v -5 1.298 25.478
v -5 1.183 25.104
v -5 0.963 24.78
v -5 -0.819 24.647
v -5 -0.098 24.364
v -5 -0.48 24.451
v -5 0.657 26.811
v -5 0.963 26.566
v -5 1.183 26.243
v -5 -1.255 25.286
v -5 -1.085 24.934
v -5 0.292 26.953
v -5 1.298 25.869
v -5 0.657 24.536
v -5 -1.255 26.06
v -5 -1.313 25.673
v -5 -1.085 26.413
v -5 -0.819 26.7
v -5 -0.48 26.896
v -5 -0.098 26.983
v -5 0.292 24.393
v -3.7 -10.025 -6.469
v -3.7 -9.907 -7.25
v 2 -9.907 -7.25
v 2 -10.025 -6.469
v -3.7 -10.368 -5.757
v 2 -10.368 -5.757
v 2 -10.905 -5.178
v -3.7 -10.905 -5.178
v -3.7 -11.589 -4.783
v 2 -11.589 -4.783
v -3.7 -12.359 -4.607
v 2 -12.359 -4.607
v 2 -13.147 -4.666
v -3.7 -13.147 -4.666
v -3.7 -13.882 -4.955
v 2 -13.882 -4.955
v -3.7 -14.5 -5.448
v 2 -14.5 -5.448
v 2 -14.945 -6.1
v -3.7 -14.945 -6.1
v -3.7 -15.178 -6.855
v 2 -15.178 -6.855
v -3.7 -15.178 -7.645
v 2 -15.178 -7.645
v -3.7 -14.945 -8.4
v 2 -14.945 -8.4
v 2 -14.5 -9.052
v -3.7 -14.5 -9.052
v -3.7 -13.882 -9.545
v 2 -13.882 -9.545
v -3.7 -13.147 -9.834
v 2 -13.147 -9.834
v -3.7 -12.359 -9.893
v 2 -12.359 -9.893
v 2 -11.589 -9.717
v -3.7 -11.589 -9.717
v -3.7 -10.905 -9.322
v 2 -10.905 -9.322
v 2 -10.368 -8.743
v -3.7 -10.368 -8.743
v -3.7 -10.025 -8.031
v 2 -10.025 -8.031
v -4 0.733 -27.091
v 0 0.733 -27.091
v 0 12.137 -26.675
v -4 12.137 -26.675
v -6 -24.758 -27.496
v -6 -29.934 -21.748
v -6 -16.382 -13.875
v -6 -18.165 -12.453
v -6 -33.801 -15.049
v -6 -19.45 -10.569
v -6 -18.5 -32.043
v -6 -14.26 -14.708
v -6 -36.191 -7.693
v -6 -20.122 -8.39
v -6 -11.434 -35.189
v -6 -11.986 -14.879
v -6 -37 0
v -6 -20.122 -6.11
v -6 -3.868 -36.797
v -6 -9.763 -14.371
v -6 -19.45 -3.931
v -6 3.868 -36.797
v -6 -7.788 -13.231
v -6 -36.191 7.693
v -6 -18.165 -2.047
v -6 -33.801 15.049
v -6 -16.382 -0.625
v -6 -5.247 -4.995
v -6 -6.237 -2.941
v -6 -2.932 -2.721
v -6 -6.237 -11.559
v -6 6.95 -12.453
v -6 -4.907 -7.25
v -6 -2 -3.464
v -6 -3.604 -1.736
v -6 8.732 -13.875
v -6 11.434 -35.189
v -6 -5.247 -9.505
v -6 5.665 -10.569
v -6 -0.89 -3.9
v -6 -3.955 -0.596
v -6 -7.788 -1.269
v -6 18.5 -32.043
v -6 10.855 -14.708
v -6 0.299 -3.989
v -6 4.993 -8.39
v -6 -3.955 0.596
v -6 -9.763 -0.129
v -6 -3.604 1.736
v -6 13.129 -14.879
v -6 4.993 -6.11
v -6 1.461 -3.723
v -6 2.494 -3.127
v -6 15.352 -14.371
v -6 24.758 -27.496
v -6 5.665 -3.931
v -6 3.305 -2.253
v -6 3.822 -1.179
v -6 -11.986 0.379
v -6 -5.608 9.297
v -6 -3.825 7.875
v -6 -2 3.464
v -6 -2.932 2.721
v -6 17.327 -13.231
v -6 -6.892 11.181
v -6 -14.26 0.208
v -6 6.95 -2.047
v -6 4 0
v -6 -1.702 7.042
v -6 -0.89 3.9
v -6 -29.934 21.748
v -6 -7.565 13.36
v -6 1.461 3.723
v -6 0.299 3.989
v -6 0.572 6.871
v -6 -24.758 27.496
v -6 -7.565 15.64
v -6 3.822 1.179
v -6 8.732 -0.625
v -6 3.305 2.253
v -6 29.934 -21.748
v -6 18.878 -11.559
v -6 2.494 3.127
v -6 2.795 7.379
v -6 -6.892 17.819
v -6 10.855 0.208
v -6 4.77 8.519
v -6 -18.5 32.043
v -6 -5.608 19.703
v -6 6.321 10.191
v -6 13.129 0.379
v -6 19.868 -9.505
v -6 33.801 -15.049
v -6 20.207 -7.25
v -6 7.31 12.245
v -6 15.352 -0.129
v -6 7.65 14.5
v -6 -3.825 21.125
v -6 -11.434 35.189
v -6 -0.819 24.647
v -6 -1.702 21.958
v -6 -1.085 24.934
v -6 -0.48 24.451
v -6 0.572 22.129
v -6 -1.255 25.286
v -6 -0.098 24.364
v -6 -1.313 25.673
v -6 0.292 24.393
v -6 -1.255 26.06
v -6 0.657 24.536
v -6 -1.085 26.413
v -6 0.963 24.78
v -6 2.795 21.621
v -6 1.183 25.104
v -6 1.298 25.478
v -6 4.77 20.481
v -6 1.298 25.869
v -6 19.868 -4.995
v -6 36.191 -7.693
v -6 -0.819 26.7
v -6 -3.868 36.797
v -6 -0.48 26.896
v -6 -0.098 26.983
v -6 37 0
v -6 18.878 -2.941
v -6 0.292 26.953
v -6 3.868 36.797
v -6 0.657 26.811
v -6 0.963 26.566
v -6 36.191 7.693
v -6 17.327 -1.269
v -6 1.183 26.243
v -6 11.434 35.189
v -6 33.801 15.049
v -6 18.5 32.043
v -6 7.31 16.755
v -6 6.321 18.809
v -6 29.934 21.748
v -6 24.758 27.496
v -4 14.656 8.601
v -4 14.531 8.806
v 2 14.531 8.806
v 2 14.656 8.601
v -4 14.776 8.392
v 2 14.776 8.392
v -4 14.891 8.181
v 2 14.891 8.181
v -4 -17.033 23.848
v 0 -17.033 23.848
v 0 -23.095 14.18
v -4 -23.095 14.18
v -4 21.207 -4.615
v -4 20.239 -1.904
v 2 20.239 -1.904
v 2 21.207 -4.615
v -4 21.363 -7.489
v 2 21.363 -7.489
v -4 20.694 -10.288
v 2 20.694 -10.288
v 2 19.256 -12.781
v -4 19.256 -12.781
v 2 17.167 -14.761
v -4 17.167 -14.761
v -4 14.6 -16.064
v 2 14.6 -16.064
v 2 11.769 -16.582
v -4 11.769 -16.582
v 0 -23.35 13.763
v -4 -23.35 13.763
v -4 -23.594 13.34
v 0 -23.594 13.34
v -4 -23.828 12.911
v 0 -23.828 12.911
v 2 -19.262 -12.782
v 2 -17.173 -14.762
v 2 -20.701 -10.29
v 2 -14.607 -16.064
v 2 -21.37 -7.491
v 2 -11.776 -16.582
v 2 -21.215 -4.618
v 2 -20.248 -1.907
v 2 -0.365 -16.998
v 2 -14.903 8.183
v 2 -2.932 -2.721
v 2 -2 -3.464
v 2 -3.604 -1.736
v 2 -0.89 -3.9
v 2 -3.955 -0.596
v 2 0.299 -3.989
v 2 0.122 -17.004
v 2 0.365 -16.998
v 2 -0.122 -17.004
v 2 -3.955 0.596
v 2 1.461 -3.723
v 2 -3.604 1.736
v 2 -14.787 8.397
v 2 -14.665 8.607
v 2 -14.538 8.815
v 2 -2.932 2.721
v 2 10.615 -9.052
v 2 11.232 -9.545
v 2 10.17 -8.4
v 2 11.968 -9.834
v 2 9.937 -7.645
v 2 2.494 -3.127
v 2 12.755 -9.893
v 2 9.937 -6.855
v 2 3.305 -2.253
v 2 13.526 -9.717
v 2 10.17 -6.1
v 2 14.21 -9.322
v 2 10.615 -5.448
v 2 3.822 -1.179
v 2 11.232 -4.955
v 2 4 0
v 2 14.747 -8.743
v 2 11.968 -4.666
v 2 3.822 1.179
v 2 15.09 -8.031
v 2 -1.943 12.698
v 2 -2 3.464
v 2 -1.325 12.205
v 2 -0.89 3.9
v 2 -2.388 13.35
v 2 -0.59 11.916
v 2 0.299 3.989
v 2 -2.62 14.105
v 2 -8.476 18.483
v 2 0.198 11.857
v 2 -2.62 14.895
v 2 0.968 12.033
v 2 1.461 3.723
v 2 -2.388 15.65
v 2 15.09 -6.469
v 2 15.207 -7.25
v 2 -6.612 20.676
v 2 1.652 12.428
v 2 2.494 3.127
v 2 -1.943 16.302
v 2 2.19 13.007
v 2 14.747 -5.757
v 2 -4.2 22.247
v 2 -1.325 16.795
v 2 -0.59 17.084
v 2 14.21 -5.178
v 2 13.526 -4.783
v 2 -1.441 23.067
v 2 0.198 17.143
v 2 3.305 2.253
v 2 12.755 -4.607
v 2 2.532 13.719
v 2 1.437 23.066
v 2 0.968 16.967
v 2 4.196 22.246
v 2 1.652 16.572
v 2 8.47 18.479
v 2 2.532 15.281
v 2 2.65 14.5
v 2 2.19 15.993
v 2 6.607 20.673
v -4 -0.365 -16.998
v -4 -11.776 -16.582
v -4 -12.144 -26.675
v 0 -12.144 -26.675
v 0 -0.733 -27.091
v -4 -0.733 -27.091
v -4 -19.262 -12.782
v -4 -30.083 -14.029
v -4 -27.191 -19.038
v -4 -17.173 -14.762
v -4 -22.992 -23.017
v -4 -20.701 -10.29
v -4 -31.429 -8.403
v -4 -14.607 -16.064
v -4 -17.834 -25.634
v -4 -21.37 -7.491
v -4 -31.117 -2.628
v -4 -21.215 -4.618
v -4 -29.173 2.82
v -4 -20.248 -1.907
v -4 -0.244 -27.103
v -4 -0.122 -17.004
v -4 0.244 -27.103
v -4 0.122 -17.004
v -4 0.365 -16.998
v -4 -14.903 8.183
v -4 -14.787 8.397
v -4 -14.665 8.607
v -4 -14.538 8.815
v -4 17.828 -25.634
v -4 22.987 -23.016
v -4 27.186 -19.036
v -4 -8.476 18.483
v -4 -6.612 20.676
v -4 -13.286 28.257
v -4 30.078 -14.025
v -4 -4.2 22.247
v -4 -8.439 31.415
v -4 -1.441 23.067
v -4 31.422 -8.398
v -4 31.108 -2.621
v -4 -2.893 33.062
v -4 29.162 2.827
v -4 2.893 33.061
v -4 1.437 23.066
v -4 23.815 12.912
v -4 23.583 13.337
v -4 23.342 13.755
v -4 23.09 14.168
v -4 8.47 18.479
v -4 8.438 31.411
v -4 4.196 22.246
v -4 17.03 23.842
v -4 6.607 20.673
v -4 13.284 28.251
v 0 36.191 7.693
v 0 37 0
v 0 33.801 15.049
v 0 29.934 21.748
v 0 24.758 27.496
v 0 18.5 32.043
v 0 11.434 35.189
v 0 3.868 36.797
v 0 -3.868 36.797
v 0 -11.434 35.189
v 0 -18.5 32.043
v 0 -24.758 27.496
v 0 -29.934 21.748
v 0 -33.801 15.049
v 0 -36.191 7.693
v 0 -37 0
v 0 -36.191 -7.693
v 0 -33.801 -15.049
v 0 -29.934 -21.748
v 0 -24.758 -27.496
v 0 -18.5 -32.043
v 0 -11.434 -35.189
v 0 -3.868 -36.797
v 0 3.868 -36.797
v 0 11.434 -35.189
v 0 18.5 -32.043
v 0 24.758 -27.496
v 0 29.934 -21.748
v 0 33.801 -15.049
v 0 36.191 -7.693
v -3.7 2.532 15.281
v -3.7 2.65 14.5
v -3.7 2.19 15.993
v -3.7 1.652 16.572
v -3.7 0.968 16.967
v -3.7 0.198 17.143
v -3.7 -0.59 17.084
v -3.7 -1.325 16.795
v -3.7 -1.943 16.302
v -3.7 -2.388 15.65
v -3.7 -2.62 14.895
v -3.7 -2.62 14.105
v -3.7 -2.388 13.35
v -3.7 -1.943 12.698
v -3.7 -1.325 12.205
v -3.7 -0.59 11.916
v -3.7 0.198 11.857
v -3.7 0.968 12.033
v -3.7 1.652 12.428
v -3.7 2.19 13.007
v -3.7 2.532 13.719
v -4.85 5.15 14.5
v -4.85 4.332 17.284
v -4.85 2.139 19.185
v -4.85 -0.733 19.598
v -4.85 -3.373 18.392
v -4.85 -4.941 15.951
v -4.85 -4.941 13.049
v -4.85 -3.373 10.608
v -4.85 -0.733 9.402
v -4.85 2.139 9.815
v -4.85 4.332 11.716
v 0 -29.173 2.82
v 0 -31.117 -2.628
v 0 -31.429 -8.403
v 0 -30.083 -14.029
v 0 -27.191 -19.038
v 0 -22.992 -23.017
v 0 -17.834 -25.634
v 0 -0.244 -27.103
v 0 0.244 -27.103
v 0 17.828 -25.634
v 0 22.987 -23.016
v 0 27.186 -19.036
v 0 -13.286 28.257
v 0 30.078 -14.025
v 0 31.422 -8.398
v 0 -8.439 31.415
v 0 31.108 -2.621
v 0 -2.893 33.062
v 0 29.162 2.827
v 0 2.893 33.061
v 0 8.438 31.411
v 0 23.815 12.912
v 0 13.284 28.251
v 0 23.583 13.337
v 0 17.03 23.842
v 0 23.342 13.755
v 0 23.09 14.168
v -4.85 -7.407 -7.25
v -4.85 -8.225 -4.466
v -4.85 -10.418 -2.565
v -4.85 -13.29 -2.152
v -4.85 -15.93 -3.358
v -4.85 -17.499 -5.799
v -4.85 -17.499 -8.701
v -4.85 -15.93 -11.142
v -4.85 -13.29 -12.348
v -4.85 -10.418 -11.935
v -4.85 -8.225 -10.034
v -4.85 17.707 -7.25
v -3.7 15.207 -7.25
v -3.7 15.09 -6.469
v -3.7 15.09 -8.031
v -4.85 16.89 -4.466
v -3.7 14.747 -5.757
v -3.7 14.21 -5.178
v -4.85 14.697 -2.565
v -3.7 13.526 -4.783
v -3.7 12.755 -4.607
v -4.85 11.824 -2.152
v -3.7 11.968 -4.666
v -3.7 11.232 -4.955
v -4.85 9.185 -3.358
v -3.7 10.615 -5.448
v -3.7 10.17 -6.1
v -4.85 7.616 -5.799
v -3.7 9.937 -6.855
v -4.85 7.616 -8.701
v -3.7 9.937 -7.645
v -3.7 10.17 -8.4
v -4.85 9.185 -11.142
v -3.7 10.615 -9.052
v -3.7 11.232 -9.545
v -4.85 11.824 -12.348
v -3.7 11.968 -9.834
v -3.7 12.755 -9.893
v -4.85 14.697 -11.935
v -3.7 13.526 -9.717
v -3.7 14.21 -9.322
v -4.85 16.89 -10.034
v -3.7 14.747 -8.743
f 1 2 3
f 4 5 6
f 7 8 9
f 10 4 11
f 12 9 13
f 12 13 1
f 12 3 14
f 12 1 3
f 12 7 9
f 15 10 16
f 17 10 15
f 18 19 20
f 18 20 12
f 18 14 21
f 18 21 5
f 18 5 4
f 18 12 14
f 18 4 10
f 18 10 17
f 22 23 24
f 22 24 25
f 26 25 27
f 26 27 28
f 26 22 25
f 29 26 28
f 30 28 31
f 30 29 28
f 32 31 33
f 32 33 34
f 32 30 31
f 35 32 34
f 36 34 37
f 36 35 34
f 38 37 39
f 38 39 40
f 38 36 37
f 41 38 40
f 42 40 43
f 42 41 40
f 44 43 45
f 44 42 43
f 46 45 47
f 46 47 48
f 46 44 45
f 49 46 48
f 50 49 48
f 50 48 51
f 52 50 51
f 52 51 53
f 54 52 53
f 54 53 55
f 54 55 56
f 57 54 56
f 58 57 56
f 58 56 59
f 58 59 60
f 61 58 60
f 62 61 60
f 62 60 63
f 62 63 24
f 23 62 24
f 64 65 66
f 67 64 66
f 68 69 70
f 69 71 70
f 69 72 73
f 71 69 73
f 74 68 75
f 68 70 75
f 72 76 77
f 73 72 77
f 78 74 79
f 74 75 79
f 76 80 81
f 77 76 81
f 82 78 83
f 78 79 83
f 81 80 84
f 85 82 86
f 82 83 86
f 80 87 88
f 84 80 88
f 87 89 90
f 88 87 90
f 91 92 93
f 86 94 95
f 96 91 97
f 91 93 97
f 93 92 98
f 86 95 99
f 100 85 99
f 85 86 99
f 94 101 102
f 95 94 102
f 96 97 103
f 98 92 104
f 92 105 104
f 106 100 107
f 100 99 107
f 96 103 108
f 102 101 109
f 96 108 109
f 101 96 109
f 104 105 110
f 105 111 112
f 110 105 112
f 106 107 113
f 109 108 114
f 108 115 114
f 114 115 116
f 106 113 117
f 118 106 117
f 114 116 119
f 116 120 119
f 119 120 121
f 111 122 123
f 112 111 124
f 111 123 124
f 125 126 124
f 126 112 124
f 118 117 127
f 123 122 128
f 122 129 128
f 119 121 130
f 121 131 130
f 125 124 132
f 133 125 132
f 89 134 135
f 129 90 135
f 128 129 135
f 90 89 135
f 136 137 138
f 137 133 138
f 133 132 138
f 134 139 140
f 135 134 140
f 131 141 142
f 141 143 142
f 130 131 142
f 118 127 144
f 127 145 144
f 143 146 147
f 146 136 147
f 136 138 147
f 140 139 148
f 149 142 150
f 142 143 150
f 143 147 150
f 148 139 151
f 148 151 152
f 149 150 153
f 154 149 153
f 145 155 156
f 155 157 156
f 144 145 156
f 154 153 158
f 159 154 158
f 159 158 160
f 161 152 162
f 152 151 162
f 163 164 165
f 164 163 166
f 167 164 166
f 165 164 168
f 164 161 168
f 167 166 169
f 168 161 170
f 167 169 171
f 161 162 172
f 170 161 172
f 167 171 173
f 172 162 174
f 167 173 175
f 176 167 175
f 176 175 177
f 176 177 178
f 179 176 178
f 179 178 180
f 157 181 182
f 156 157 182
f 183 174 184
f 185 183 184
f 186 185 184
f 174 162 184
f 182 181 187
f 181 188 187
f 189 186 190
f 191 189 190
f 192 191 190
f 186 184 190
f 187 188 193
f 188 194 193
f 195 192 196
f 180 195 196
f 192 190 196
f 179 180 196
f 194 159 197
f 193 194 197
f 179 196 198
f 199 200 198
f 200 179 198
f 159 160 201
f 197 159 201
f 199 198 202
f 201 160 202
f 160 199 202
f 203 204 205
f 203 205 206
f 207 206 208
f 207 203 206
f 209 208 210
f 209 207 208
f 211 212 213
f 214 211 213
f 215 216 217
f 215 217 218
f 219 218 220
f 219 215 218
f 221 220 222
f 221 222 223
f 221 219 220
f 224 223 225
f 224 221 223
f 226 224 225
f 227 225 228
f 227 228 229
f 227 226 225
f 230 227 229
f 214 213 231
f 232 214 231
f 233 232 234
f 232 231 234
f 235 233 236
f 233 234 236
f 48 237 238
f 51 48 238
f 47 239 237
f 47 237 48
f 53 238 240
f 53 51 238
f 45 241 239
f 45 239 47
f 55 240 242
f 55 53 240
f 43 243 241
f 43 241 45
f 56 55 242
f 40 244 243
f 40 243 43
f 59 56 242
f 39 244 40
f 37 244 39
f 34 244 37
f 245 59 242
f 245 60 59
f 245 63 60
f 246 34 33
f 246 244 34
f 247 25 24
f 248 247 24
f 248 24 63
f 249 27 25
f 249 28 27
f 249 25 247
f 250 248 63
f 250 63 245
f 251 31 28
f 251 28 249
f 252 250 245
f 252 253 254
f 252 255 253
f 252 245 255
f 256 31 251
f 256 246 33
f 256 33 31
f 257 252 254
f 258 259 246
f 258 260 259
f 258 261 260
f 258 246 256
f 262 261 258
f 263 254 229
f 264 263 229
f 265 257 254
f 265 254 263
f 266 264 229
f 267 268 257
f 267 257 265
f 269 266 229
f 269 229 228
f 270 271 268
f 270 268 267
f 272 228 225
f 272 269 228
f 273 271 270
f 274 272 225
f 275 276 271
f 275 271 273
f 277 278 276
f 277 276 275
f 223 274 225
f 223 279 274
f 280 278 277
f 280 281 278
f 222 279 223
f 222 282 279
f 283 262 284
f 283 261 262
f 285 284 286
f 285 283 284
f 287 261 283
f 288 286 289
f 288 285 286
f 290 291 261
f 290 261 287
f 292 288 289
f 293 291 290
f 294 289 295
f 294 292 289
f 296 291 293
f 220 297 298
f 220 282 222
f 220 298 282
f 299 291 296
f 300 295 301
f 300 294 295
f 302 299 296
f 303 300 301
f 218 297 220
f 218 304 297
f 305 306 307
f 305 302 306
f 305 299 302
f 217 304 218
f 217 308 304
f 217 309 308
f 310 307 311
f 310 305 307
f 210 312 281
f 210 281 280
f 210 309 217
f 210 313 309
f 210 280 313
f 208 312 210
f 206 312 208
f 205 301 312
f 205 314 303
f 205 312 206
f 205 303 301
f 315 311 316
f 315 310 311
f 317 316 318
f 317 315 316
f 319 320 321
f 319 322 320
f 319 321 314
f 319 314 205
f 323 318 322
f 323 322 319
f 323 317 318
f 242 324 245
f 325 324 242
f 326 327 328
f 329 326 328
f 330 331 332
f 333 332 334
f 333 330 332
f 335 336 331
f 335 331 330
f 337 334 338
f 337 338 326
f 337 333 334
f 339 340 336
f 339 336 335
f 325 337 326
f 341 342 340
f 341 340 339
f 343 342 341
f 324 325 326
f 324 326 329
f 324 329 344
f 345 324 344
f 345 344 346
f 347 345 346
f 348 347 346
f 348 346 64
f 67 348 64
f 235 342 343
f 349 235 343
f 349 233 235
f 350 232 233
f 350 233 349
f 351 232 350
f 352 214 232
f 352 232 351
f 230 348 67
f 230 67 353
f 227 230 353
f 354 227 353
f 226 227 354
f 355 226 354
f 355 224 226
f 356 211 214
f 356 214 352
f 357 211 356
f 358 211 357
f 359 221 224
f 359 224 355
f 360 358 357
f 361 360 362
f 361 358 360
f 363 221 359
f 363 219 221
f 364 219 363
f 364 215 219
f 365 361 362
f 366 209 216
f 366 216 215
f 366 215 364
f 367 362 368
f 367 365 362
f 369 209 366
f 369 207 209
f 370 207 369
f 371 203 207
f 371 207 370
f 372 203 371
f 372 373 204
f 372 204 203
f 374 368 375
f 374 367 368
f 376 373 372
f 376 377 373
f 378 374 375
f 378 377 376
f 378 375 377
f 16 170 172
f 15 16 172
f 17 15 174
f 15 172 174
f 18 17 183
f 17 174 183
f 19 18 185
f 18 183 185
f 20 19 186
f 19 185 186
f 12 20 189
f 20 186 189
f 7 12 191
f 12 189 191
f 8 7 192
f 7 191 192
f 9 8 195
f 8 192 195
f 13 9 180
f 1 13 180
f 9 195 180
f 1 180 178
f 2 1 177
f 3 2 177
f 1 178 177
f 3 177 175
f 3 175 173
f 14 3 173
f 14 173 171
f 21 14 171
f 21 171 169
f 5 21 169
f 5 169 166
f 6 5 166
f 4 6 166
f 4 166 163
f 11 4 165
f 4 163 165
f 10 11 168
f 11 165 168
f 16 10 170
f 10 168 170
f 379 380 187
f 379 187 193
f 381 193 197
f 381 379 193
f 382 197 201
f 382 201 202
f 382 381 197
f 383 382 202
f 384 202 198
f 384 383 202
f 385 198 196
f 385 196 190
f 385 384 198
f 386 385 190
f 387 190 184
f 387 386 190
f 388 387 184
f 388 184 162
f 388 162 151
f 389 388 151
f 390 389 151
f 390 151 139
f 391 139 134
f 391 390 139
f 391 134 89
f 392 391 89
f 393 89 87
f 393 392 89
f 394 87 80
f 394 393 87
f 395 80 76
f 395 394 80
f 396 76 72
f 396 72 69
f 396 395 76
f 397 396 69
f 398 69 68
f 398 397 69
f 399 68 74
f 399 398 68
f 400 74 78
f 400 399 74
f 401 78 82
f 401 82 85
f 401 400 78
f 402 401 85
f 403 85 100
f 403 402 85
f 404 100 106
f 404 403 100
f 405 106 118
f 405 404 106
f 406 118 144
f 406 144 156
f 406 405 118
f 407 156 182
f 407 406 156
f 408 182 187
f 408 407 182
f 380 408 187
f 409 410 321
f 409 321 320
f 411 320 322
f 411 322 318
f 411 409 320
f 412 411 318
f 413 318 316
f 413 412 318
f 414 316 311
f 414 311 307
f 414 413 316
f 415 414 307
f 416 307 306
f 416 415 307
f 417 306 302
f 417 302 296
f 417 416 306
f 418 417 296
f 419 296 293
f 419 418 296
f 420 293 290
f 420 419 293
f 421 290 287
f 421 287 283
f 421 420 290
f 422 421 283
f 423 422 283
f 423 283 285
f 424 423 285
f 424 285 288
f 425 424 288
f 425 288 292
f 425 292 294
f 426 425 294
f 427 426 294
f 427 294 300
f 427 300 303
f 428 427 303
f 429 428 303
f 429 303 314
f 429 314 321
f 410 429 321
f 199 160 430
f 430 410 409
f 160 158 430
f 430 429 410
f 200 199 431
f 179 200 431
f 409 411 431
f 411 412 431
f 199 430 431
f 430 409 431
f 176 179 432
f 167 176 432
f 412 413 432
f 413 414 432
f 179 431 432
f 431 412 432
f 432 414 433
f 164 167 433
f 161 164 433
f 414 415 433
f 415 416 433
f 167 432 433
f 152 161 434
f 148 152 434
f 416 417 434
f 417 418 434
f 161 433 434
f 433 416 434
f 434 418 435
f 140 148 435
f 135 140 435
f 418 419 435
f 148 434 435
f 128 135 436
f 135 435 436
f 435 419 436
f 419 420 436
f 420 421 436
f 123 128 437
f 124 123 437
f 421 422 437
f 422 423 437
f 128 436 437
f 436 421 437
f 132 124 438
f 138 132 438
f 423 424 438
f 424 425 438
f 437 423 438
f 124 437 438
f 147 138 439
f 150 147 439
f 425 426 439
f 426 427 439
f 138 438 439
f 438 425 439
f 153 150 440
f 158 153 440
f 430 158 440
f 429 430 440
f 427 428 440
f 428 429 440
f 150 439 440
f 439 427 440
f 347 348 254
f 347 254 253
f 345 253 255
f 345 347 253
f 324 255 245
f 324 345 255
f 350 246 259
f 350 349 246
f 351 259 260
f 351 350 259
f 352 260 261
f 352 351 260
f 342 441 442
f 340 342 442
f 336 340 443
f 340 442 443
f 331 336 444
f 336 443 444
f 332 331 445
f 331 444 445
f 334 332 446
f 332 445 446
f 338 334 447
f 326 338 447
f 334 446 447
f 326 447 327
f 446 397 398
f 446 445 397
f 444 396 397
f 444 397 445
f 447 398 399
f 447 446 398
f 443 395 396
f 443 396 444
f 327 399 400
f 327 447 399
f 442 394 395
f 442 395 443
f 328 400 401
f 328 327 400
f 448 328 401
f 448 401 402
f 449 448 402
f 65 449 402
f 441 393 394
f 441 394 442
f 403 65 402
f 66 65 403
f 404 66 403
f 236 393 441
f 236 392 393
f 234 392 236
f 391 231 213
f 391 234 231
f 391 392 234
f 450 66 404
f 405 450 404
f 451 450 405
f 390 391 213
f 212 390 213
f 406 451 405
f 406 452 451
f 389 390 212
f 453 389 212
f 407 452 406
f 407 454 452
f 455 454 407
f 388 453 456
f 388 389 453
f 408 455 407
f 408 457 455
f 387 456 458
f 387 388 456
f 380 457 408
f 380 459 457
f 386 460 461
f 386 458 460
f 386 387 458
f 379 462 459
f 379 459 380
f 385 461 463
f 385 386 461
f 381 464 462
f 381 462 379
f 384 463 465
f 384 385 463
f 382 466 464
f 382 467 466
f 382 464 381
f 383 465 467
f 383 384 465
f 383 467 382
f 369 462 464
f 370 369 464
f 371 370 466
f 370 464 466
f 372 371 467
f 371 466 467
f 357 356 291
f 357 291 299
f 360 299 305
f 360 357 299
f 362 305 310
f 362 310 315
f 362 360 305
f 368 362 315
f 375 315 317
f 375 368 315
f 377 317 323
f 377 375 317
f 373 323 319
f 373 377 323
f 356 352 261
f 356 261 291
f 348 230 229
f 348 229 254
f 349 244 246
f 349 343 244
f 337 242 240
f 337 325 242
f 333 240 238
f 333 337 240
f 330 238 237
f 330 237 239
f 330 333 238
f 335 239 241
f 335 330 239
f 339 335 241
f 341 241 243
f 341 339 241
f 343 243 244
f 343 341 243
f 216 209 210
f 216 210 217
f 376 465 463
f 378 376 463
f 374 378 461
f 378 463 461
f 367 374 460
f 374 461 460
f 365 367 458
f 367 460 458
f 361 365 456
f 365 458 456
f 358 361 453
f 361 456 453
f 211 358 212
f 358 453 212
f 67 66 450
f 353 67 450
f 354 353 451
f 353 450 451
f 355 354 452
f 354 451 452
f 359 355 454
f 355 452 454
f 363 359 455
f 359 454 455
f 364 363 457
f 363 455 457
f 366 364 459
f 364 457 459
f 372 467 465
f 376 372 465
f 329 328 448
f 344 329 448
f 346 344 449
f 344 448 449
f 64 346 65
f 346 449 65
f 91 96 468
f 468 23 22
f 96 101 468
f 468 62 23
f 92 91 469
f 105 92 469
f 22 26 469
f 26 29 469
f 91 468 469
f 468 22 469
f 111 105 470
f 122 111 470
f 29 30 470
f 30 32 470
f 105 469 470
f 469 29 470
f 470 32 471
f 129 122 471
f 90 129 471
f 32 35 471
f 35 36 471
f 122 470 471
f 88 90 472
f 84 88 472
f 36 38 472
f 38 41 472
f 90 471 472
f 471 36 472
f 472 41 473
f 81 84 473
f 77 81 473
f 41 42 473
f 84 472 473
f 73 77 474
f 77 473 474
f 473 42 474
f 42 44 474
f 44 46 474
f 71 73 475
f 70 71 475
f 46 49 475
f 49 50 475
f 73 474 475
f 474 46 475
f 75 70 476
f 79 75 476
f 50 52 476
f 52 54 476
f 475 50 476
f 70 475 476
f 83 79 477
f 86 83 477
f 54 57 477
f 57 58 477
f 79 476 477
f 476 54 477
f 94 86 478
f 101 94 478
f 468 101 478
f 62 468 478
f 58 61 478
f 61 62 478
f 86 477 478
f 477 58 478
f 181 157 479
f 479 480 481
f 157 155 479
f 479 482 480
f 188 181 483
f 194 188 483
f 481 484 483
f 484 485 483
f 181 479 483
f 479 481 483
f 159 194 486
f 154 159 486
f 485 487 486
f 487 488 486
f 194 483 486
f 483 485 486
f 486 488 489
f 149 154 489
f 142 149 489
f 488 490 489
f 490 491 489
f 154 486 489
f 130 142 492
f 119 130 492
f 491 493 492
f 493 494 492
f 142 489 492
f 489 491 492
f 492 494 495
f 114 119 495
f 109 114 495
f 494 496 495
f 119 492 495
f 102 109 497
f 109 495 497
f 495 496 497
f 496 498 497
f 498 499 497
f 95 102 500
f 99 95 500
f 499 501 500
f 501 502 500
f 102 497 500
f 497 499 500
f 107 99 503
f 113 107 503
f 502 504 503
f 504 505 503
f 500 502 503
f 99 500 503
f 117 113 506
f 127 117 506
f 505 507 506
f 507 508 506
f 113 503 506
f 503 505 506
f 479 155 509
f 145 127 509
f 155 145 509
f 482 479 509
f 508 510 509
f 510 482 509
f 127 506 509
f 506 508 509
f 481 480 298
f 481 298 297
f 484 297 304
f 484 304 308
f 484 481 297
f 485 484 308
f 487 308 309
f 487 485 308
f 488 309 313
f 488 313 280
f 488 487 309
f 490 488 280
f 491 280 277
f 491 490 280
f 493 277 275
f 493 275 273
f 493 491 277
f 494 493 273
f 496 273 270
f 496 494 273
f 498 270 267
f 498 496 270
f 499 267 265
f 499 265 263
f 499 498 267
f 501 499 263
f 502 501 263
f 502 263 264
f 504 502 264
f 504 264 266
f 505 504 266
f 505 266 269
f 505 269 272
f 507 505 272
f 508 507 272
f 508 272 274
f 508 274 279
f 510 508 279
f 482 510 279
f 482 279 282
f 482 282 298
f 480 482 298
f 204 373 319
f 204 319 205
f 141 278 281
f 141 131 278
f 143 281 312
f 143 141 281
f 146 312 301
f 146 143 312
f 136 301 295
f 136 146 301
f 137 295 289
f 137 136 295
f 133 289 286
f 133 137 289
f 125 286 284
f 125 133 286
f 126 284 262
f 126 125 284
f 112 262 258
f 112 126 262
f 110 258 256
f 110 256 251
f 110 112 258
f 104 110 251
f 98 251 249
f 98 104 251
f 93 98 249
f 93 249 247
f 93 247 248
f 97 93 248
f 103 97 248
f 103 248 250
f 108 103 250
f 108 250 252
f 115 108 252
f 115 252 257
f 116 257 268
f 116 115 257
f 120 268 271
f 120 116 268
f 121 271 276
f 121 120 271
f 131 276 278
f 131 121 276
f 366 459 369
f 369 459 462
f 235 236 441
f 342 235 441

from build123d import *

# Parameters (mm, degrees)
F0_R     = 37
F0_R_2   = 2.65
F0_R_3   = 4
F1_DEPTH = 6
F2_DEPTH = 4
F3_DEPTH = 2
F4_SIZE2 = 2.3
F4_SIZE  = 5
F5_R     = 1.3130068335
F6_DEPTH = 1


with BuildPart() as f1:
    # F0 (on Right) → F1 (new body)
    with BuildSketch(Plane.YZ):
        Circle(F0_R)
        with BuildLine():
            Line((-23.0952370323, 14.180454946), (-17.0328632471, 23.8484731203))
            ThreePointArc((-17.0328632471, 23.8484731203), (0.0002590164, 33.2703478915), (17.0295377344, 23.8415279974))
            Line((17.0295377344, 23.8415279974), (23.0899184639, 14.167925942))
            ThreePointArc((23.0899184639, 14.167925942), (23.4636524397, 13.5467460522), (23.8147430167, 12.9124929901))
            Line((23.8147430167, 12.9124929901), (29.162137778, 2.827248294))
            ThreePointArc((29.162137778, 2.827248294), (28.813095975, -16.6349496309), (12.1369519401, -26.6751288313))
            Line((12.1369519401, -26.6751288313), (0.7330157043, -27.0912894495))
            ThreePointArc((0.7330157043, -27.0912894495), (0, -27.1046598669), (-0.7330157043, -27.0912894495))
            Line((-0.7330157043, -27.0912894495), (-12.1441739659, -26.6748652799))
            ThreePointArc((-12.1441739659, -26.6748652799), (-28.8182692269, -16.6382354957), (-29.1731979579, 2.8202694775))
            Line((-29.1731979579, 2.8202694775), (-23.8282527367, 12.9108345034))
            ThreePointArc((-23.8282527367, 12.9108345034), (-23.4733240056, 13.5523299334), (-23.0952370323, 14.180454946))
        make_face(mode=Mode.SUBTRACT)
        with BuildLine():
            ThreePointArc((17.0295377344, 23.8415279974), (0.0002590164, 33.2703478915), (-17.0328632471, 23.8484731203))
            Line((-17.0328632471, 23.8484731203), (-23.0952370323, 14.180454946))
            ThreePointArc((-23.0952370323, 14.180454946), (-23.4733240056, 13.5523299334), (-23.8282527367, 12.9108345034))
            Line((-23.8282527367, 12.9108345034), (-29.1731979579, 2.8202694775))
            ThreePointArc((-29.1731979579, 2.8202694775), (-28.8182692269, -16.6382354957), (-12.1441739659, -26.6748652799))
            Line((-12.1441739659, -26.6748652799), (-0.7330157043, -27.0912894495))
            ThreePointArc((-0.7330157043, -27.0912894495), (0, -27.1046598669), (0.7330157043, -27.0912894495))
            Line((0.7330157043, -27.0912894495), (12.1369519401, -26.6751288313))
            ThreePointArc((12.1369519401, -26.6751288313), (28.813095975, -16.6349496309), (29.162137778, 2.827248294))
            Line((29.162137778, 2.827248294), (23.8147430167, 12.9124929901))
            ThreePointArc((23.8147430167, 12.9124929901), (23.4636524397, 13.5467460522), (23.0899184639, 14.167925942))
            Line((23.0899184639, 14.167925942), (17.0295377344, 23.8415279974))
        make_face()
        with BuildLine():
            Line((-14.5383641102, 8.8148297318), (-8.4759903249, 18.482847906))
            ThreePointArc((-8.4759903249, 18.482847906), (-0.0018003141, 23.1703476982), (8.4704774851, 18.4793926211))
            Line((8.4704774851, 18.4793926211), (14.5308582146, 8.8057905657))
            ThreePointArc((14.5308582146, 8.8057905657), (14.7167955123, 8.4967458506), (14.8914674376, 8.1811970698))
            Line((14.8914674376, 8.1811970698), (20.2388621989, -1.9040476263))
            ThreePointArc((20.2388621989, -1.9040476263), (20.0652095641, -11.5867329668), (11.7686206585, -16.5818468966))
            Line((11.7686206585, -16.5818468966), (0.3646844227, -16.9980075148))
            ThreePointArc((0.3646844227, -16.9980075148), (0, -17.0046594636), (-0.3646844227, -16.9980075148))
            Line((-0.3646844227, -16.9980075148), (-11.7758426843, -16.5815833453))
            ThreePointArc((-11.7758426843, -16.5815833453), (-20.0714122995, -11.5882352941), (-20.2479937541, -1.9073872429))
            Line((-20.2479937541, -1.9073872429), (-14.9030485329, 8.183177783))
            ThreePointArc((-14.9030485329, 8.183177783), (-14.7264670782, 8.5023297318), (-14.5383641102, 8.8148297318))
        make_face(mode=Mode.SUBTRACT)
        with BuildLine():
            ThreePointArc((8.4704774851, 18.4793926211), (-0.0018003141, 23.1703476982), (-8.4759903249, 18.482847906))
            Line((-8.4759903249, 18.482847906), (-14.5383641102, 8.8148297318))
            ThreePointArc((-14.5383641102, 8.8148297318), (-14.7264670782, 8.5023297318), (-14.9030485329, 8.183177783))
            Line((-14.9030485329, 8.183177783), (-20.2479937541, -1.9073872429))
            ThreePointArc((-20.2479937541, -1.9073872429), (-20.0714122995, -11.5882352941), (-11.7758426843, -16.5815833453))
            Line((-11.7758426843, -16.5815833453), (-0.3646844227, -16.9980075148))
            ThreePointArc((-0.3646844227, -16.9980075148), (0, -17.0046594636), (0.3646844227, -16.9980075148))
            Line((0.3646844227, -16.9980075148), (11.7686206585, -16.5818468966))
            ThreePointArc((11.7686206585, -16.5818468966), (20.0652095641, -11.5867329668), (20.2388621989, -1.9040476263))
            Line((20.2388621989, -1.9040476263), (14.8914674376, 8.1811970698))
            ThreePointArc((14.8914674376, 8.1811970698), (14.7167955123, 8.4967458506), (14.5308582146, 8.8057905657))
            Line((14.5308582146, 8.8057905657), (8.4704774851, 18.4793926211))
        make_face()
        with Locations((-12.5573683549, -7.25)):
            Circle(F0_R_2, mode=Mode.SUBTRACT)
        with Locations((12.5573683549, -7.25)):
            Circle(F0_R_2, mode=Mode.SUBTRACT)
        Circle(F0_R_3, mode=Mode.SUBTRACT)
        with Locations((0, 14.5)):
            Circle(F0_R_2, mode=Mode.SUBTRACT)
    extrude(amount=-F1_DEPTH)

    # F0 (on Right) → F2 (cut)
    with BuildSketch(Plane.YZ):
        with BuildLine():
            ThreePointArc((17.0295377344, 23.8415279974), (0.0002590164, 33.2703478915), (-17.0328632471, 23.8484731203))
            Line((-17.0328632471, 23.8484731203), (-23.0952370323, 14.180454946))
            ThreePointArc((-23.0952370323, 14.180454946), (-23.4733240056, 13.5523299334), (-23.8282527367, 12.9108345034))
            Line((-23.8282527367, 12.9108345034), (-29.1731979579, 2.8202694775))
            ThreePointArc((-29.1731979579, 2.8202694775), (-28.8182692269, -16.6382354957), (-12.1441739659, -26.6748652799))
            Line((-12.1441739659, -26.6748652799), (-0.7330157043, -27.0912894495))
            ThreePointArc((-0.7330157043, -27.0912894495), (0, -27.1046598669), (0.7330157043, -27.0912894495))
            Line((0.7330157043, -27.0912894495), (12.1369519401, -26.6751288313))
            ThreePointArc((12.1369519401, -26.6751288313), (28.813095975, -16.6349496309), (29.162137778, 2.827248294))
            Line((29.162137778, 2.827248294), (23.8147430167, 12.9124929901))
            ThreePointArc((23.8147430167, 12.9124929901), (23.4636524397, 13.5467460522), (23.0899184639, 14.167925942))
            Line((23.0899184639, 14.167925942), (17.0295377344, 23.8415279974))
        make_face()
        with BuildLine():
            Line((-14.5383641102, 8.8148297318), (-8.4759903249, 18.482847906))
            ThreePointArc((-8.4759903249, 18.482847906), (-0.0018003141, 23.1703476982), (8.4704774851, 18.4793926211))
            Line((8.4704774851, 18.4793926211), (14.5308582146, 8.8057905657))
            ThreePointArc((14.5308582146, 8.8057905657), (14.7167955123, 8.4967458506), (14.8914674376, 8.1811970698))
            Line((14.8914674376, 8.1811970698), (20.2388621989, -1.9040476263))
            ThreePointArc((20.2388621989, -1.9040476263), (20.0652095641, -11.5867329668), (11.7686206585, -16.5818468966))
            Line((11.7686206585, -16.5818468966), (0.3646844227, -16.9980075148))
            ThreePointArc((0.3646844227, -16.9980075148), (0, -17.0046594636), (-0.3646844227, -16.9980075148))
            Line((-0.3646844227, -16.9980075148), (-11.7758426843, -16.5815833453))
            ThreePointArc((-11.7758426843, -16.5815833453), (-20.0714122995, -11.5882352941), (-20.2479937541, -1.9073872429))
            Line((-20.2479937541, -1.9073872429), (-14.9030485329, 8.183177783))
            ThreePointArc((-14.9030485329, 8.183177783), (-14.7264670782, 8.5023297318), (-14.5383641102, 8.8148297318))
        make_face(mode=Mode.SUBTRACT)
    extrude(amount=-F2_DEPTH, mode=Mode.SUBTRACT)

    # F3 (add): a face of the model
    f3_faces = [f1.faces().sort_by_distance(p)[0] for p in [
        (0, -6.0488520011, -16.2030604824),
    ]]
    extrude(f3_faces, amount=F3_DEPTH)

    # F4
    f4_edges = [f1.edges().sort_by_distance(p)[0] for p in [
        (-6, -2.65, 14.5),
        (-6, 9.907368, -7.25),
        (-6, -15.207368, -7.25),
    ]]
    f4_side = f1.faces().sort_by_distance((-6, -35.953482, 0))[0]
    chamfer(f4_edges, length=F4_SIZE, length2=F4_SIZE2, reference=f4_side)

    # F5 (on face) → F6 (cut)
    with BuildSketch(Plane(origin=(-6, 0, 0), x_dir=(0, -1, 0), z_dir=(-1, 0, 0))):
        with Locations((0, 25.6734099239)):
            Circle(F5_R)
    extrude(amount=-F6_DEPTH, mode=Mode.SUBTRACT)


solid = f1.part
